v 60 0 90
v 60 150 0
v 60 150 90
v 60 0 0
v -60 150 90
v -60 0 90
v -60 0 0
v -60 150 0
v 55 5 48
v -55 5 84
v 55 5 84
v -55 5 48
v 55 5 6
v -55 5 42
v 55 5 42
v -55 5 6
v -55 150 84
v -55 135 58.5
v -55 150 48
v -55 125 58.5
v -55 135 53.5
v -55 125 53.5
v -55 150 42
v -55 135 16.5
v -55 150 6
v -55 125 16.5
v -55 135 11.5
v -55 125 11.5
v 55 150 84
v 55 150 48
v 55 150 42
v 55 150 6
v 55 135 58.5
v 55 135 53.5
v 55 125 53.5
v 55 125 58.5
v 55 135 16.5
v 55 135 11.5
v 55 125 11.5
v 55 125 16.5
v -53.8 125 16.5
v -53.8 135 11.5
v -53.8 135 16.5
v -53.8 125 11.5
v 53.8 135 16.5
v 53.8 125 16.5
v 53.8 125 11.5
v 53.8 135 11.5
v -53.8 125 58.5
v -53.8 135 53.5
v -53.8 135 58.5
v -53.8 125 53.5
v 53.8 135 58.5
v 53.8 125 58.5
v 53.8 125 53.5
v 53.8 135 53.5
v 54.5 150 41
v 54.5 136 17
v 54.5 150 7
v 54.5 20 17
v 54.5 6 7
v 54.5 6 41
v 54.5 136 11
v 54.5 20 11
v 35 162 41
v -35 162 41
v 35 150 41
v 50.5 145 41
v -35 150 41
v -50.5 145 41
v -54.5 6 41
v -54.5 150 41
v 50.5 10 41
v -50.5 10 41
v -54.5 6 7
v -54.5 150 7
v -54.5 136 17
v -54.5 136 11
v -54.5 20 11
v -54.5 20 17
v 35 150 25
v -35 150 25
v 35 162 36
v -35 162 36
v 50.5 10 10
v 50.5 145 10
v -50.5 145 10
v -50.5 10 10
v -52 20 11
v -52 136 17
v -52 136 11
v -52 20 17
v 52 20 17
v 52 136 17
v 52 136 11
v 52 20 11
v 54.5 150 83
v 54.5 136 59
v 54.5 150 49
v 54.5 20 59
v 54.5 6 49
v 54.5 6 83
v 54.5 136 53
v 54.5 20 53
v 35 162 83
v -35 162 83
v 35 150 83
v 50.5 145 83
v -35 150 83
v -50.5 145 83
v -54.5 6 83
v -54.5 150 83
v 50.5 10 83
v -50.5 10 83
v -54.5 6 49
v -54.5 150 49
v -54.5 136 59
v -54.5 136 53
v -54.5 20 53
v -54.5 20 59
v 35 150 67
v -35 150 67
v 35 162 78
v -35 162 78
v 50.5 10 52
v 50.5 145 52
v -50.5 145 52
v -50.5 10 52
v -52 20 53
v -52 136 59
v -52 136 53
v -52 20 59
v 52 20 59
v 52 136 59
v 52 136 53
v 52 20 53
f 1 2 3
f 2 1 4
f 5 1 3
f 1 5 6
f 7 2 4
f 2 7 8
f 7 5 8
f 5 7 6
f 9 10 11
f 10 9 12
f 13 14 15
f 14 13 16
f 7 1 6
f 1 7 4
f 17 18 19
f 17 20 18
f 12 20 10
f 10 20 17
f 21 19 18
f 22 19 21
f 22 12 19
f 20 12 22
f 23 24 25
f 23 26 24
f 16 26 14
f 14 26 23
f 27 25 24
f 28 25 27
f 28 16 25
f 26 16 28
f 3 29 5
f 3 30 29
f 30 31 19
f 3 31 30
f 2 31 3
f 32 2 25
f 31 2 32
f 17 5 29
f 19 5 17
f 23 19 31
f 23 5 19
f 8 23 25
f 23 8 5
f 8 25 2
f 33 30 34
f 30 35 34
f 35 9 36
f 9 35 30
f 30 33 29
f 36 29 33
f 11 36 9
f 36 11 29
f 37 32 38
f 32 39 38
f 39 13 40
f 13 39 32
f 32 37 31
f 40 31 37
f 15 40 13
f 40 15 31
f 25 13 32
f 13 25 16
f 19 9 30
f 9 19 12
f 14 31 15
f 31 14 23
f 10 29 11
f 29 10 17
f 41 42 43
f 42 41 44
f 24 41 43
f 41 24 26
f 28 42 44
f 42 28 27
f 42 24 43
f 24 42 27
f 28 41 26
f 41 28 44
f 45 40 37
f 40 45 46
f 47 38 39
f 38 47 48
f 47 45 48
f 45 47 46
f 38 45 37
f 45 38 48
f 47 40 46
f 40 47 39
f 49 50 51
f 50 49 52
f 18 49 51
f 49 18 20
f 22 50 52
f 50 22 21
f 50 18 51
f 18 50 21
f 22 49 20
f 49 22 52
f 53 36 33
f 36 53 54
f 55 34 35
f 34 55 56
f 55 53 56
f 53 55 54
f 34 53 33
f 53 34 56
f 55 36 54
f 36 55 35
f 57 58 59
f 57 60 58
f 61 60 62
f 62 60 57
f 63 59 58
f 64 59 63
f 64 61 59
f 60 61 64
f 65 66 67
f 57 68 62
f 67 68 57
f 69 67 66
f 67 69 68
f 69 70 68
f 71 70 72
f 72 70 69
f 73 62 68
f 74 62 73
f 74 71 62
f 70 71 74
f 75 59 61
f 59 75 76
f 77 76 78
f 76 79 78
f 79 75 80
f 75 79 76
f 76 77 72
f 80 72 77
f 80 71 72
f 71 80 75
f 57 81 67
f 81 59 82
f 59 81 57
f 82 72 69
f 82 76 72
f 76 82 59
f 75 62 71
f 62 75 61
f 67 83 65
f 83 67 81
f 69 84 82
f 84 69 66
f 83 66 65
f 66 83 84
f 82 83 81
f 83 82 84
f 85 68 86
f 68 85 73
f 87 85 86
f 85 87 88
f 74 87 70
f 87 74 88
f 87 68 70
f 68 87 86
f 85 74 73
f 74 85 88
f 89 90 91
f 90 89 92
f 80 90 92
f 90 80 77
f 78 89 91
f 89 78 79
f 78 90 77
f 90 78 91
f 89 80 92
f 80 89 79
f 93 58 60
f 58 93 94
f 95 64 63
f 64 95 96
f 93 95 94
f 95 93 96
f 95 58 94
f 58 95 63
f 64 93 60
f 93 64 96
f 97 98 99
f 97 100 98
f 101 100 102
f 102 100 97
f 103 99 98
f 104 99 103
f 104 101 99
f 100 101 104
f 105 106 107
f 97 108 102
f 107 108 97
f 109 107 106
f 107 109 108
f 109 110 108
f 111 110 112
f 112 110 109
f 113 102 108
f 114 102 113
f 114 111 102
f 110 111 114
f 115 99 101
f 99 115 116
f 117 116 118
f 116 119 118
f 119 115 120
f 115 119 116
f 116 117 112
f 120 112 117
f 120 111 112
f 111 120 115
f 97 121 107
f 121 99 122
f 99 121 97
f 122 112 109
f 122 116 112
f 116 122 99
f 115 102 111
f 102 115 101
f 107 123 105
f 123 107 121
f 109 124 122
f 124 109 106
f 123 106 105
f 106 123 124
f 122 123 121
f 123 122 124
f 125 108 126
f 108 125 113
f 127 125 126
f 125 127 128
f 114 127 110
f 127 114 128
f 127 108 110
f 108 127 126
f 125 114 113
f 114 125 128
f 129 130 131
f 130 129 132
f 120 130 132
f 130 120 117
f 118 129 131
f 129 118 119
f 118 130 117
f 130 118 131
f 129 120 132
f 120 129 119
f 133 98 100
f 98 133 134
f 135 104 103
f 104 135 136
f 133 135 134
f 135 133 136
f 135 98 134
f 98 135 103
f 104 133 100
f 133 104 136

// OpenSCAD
part = "assembly"; // [assembly:Assembly, frame:Frame, drawer:Drawer]
cadverify_only = "";
module instance(name, part, unit = 1) {
    echo(cadverify_instance = [name, part, unit]);
    if (cadverify_only == "" || cadverify_only == name) children();
}
// frame assembly coords: X -60..60, Y 0..150, Z 0..90
module frame_asm() {
    union() {
        translate([-60,0,0]) cube([120,5,90]);
        translate([-60,0,0]) cube([5,150,90]);
        translate([55,0,0]) cube([5,150,90]);
        translate([-55,5,0]) cube([110,145,6]);
        translate([-55,5,42]) cube([110,145,6]);
        translate([-55,5,84]) cube([110,145,6]);
        translate([-55,125,11.5]) cube([1.2,10,5]);
        translate([53.8,125,11.5]) cube([1.2,10,5]);
        translate([-55,125,53.5]) cube([1.2,10,5]);
        translate([53.8,125,53.5]) cube([1.2,10,5]);
    }
}
module frame_print() {
    translate([0,90,0]) rotate([90,0,0]) frame_asm();
}
// drawer part coords: X -54.5..54.5, Y 0..144 body + handle to 156, Z 0..34
module drawer_raw() {
    difference() {
        union() {
            translate([-54.5,0,0]) cube([109,144,34]);
            // handle wedge (solid triangular prism via hull) + tip block, overlapped for manifold union
            hull() {
                translate([-35,143,18]) cube([70,1,1]);
                translate([-35,143,29]) cube([70,1,1]);
                translate([-35,155,29]) cube([70,1,1]);
            }
            translate([-35,143,29]) cube([70,13,5]);
        }
        translate([-50.5,4,3]) cube([101,135,32]);
        translate([-54.5,14,4]) cube([2.5,116,6]);
        translate([52,14,4]) cube([2.5,116,6]);
    }
}
module drawer_part() { drawer_raw(); }
module frame_spec() {
    echo(cadverify_spec = [
        ["bounds", [[-60,0,0],[60,90,150]]],
        ["bodies", 1],
        ["through_holes", 0],
        ["support_faces", [["bed","-z",5000]]],
        ["overhangs_allowed", [
            ["stop tab underside, bridge 1.2mm", [[-55,73,124],[-53.8,79,126]]],
            ["stop tab underside, bridge 1.2mm", [[53.8,73,124],[55,79,126]]],
            ["stop tab underside, bridge 1.2mm", [[-55,31,124],[-53.8,37,126]]],
            ["stop tab underside, bridge 1.2mm", [[53.8,31,124],[55,37,126]]]
        ]],
        ["copies", 1],
        ["details", [
            ["back_panel","material",[[-60,0,0],[60,90,5]],0.9],
            ["stop_tab_ll","material",[[-55,73.5,125],[-53.8,78.5,135]],0.9],
            ["stop_tab_lr","material",[[53.8,73.5,125],[55,78.5,135]],0.9],
            ["stop_tab_ul","material",[[-55,31.5,125],[-53.8,36.5,135]],0.9],
            ["stop_tab_ur","material",[[53.8,31.5,125],[55,36.5,135]],0.9],
            ["lower_cavity","void",[[-55,48,5],[55,84,150]],0.9],
            ["upper_cavity","void",[[-55,6,5],[55,42,150]],0.9],
            ["back","thickness",[0,10,-1],[0,0,1],5]
        ]]
    ]);
}
module drawer_spec() {
    echo(cadverify_spec = [
        ["bounds", [[-54.5,0,0],[54.5,156,34]]],
        ["bodies", 1],
        ["through_holes", 0],
        ["support_faces", [["bed","-z",10000]]],
        ["overhangs_allowed", [
            ["drawer slide groove ceiling, bridge 5mm", [[-54.5,14,9],[-52,130,11]]],
            ["drawer slide groove ceiling, bridge 5mm", [[52,14,9],[54.5,130,11]]]
        ]],
        ["copies", 2],
        ["details", [
            ["pull_tip","material",[[-35,150,30],[35,156,34]],0.9],
            ["groove_left","void",[[-54.5,14,4],[-52,130,10]],0.9],
            ["groove_right","void",[[52,14,4],[54.5,130,10]],0.9],
            ["drawer_cavity","void",[[-50.5,4,3],[50.5,139,34]],0.9],
            ["bottom","thickness",[0,70,-1],[0,0,1],3],
            ["side_walls","thickness",[-55.5,70,20],[1,0,0],4],
            ["pull_shape","view",[[-35,144,18],[35,156,34]]]
        ]]
    ]);
}
module assembly_spec() {
    echo(cadverify_spec = [
        ["bounds", [[-60,0,0],[60,162,90]]],
        ["support_faces", [["base","-z",5000]]],
        ["allowed_interferences", []],
        ["motions", [
            ["drawer_lower_slide", ["drawer_lower"], "slide", [0,1,0], [0,105], ["stops", [0,105]]],
            ["drawer_upper_slide", ["drawer_upper"], "slide", [0,1,0], [0,105], ["stops", [0,105]]]
        ]],
        ["assembly_order", [
            [["frame"], [0,0,0]],
            [["drawer_lower"], [0,-1,0], ["flex", [["drawer_lower","frame",0.7,"stop tabs snap into grooves"]]]],
            [["drawer_upper"], [0,-1,0], ["flex", [["drawer_upper","frame",0.7,"stop tabs snap into grooves"]]]]
        ]]
    ]);
}
if (part == "frame") { frame_spec(); frame_print(); }
else if (part == "drawer") { drawer_spec(); drawer_part(); }
else if (part == "assembly") {
    assembly_spec();
    instance("frame","frame",1) frame_asm();
    instance("drawer_lower","drawer",1) translate([0,6,7]) drawer_raw();
    instance("drawer_upper","drawer",1) translate([0,6,49]) drawer_raw();
}
